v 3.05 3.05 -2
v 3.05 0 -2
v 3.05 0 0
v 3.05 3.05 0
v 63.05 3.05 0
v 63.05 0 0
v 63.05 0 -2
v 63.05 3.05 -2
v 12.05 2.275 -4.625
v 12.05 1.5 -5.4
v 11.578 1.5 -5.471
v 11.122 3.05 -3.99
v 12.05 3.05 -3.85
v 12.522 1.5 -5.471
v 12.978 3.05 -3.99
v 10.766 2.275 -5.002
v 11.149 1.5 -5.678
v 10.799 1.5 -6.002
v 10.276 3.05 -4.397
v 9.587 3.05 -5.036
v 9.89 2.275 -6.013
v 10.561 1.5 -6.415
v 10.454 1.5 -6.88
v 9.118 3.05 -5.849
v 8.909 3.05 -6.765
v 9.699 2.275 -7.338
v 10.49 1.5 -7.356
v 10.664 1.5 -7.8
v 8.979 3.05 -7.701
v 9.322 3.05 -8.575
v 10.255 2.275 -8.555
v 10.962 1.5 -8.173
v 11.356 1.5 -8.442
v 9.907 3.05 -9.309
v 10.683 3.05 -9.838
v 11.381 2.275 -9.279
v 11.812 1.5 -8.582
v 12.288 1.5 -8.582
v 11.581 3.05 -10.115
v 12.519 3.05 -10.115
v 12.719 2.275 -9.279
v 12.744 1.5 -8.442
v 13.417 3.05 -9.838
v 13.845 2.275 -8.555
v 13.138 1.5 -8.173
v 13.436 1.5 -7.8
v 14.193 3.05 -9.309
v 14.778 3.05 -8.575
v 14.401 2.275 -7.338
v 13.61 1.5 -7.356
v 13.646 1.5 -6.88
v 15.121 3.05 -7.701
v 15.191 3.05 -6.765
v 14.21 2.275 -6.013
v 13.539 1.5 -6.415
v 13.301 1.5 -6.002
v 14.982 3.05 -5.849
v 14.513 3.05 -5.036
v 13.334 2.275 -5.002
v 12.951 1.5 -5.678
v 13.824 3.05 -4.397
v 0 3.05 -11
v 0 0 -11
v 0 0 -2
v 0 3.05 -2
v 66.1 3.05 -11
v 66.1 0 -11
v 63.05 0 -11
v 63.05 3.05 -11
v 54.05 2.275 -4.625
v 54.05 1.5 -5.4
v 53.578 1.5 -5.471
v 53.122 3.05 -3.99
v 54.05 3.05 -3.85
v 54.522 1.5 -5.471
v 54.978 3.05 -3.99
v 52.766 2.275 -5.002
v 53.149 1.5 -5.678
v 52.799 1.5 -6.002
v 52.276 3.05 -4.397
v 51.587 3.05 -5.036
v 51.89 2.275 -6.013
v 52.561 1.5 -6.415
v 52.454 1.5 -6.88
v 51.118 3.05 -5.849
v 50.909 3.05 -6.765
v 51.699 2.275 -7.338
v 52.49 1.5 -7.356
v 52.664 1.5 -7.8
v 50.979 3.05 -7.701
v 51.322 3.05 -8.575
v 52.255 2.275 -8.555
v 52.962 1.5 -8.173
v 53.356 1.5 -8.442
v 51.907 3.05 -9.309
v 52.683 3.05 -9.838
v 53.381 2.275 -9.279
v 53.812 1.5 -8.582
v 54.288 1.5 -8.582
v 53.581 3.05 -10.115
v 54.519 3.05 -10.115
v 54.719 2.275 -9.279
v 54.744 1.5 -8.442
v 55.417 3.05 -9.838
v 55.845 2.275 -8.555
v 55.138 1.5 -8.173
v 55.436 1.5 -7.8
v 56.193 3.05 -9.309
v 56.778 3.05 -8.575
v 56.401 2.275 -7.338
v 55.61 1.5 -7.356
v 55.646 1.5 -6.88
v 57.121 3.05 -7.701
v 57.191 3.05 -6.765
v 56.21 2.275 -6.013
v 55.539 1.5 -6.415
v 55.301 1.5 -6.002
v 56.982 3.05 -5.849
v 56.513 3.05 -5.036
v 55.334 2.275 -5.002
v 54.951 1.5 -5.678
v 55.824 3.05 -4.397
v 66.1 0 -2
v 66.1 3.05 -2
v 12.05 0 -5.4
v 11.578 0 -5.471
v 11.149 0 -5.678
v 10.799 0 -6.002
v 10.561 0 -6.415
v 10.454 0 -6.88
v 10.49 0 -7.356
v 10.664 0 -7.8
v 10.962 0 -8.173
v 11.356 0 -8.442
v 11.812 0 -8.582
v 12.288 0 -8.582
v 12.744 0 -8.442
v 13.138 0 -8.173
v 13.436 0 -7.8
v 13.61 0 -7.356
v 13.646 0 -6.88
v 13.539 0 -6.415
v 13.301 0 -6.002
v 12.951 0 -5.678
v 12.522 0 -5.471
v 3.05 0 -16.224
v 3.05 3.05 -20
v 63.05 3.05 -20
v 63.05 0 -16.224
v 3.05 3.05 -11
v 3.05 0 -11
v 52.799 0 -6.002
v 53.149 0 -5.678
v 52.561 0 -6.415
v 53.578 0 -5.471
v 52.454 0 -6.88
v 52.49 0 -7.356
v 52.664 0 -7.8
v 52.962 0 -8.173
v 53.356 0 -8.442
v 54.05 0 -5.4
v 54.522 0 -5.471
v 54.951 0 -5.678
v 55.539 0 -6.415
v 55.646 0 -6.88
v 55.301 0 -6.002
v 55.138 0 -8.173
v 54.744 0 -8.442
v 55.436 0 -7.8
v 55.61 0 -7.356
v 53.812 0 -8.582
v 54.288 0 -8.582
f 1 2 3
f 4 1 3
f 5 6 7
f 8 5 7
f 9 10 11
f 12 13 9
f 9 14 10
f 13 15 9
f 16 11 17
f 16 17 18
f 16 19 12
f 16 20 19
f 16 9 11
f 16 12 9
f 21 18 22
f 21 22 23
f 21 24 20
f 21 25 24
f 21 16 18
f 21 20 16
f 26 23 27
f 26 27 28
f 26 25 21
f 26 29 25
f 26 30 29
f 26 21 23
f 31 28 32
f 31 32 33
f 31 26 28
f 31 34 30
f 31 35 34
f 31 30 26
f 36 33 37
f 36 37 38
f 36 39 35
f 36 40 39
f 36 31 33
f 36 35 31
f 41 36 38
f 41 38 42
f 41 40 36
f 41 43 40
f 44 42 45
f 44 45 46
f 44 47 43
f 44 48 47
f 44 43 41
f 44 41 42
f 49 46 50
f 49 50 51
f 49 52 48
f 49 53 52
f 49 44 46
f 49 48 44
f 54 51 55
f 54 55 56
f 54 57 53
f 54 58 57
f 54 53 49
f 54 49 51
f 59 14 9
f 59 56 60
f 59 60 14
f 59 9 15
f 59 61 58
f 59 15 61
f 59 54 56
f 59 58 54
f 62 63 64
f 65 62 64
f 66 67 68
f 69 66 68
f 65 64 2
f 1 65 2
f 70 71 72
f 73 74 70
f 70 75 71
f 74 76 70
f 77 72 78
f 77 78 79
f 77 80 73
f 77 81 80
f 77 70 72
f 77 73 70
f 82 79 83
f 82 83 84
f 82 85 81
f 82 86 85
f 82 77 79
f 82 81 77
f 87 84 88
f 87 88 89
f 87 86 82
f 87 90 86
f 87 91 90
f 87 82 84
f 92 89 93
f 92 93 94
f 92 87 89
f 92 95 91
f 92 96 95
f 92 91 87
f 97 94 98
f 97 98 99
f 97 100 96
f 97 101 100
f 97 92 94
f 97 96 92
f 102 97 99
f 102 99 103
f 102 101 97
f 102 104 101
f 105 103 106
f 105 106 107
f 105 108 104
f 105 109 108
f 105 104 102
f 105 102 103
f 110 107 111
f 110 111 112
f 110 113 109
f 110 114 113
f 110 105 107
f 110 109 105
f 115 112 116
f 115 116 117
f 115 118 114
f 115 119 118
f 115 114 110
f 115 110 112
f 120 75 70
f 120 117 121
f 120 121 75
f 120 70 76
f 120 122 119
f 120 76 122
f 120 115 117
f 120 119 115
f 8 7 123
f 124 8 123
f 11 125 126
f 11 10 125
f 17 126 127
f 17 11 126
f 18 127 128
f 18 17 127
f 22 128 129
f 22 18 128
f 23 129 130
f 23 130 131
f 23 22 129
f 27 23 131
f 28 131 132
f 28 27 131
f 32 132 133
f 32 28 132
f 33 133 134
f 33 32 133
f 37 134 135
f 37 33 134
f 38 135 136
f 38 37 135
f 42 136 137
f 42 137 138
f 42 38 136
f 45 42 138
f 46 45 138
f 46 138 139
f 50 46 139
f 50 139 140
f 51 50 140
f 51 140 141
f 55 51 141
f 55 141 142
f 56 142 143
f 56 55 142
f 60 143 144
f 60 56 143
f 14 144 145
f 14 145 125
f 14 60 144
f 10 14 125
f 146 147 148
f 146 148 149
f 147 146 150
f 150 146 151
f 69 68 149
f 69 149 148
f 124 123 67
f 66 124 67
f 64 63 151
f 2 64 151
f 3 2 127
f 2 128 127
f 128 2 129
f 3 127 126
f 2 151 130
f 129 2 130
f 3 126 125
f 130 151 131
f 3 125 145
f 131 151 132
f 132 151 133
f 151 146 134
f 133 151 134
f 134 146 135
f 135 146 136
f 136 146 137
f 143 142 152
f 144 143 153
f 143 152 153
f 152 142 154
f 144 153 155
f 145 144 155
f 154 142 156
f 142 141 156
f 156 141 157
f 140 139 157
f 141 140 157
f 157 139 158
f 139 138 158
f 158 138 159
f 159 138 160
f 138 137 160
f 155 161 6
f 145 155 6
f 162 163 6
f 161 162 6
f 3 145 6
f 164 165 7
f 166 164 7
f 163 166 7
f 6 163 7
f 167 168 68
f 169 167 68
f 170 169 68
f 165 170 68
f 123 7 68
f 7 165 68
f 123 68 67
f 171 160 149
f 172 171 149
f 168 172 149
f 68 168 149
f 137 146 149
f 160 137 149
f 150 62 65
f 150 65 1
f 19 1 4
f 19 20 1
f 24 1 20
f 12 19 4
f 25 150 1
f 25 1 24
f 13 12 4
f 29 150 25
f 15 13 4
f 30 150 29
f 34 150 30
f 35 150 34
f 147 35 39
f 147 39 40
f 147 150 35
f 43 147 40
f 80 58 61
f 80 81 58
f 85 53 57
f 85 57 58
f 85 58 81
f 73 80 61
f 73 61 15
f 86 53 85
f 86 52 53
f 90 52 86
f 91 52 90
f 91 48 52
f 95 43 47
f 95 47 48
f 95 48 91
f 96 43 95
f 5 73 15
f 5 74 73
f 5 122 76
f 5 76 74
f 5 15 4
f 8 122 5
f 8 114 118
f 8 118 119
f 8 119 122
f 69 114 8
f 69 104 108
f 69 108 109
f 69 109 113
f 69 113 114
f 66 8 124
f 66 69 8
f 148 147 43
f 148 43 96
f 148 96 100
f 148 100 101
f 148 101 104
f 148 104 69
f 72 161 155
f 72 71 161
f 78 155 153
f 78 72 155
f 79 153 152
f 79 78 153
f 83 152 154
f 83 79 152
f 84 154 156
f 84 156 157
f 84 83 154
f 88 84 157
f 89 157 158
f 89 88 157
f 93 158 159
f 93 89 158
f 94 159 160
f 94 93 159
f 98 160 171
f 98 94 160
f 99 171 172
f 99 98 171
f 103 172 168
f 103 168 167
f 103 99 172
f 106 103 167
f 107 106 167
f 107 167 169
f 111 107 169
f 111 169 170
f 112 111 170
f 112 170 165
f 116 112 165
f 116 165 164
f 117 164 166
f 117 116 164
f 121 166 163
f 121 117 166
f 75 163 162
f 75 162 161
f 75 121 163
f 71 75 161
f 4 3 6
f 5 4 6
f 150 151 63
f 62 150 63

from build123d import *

# Parameters (mm, degrees)
BOSS_EXTRUDE1_DEPTH = 3.05
CUT_EXTRUDE1_DEPTH  = 67.216349945


with BuildPart() as part:
    # Sketch1 → Boss-Extrude1 (new body)
    with BuildSketch(Plane(origin=(0, 0, 0), x_dir=(1, 0, 0), z_dir=(0, 1, 0))):
        with BuildLine():
            Line((12.05, 5.5), (12.05, 0))
            Line((12.05, 0), (54.05, 0))
            Line((54.05, 0), (54.05, 5.5))
            ThreePointArc((54.05, 5.5), (52.989339828, 8.060660172), (55.55, 7))
            Line((55.55, 7), (66.1, 7))
            Line((66.1, 7), (66.1, 11))
            Line((66.1, 11), (63.05, 11))
            Line((63.05, 11), (63.05, 20))
            Line((63.05, 20), (3.05, 20))
            Line((3.05, 20), (3.05, 11))
            Line((3.05, 11), (0, 11))
            Line((0, 11), (0, 7))
            Line((0, 7), (10.55, 7))
            ThreePointArc((10.55, 7), (12.05, 8.5), (13.55, 7))
            ThreePointArc((13.55, 7), (13.110660172, 5.939339828), (12.05, 5.5))
        make_face()
        with BuildLine():
            Line((3.05, 2), (3.05, 0))
            Line((3.05, 0), (12.05, 0))
            Line((12.05, 0), (12.05, 5.5))
            ThreePointArc((12.05, 5.5), (10.989339828, 5.939339828), (10.55, 7))
            Line((10.55, 7), (0, 7))
            Line((0, 7), (0, 2))
            Line((0, 2), (3.05, 2))
        make_face()
        with BuildLine():
            Line((54.05, 5.5), (54.05, 0))
            Line((54.05, 0), (63.05, 0))
            Line((63.05, 0), (63.05, 2))
            Line((63.05, 2), (66.1, 2))
            Line((66.1, 2), (66.1, 7))
            Line((66.1, 7), (55.55, 7))
            ThreePointArc((55.55, 7), (55.110660172, 5.939339828), (54.05, 5.5))
        make_face()
    extrude(amount=BOSS_EXTRUDE1_DEPTH)

    # Sketch5 → CSK for M3 Flat Head Machine Screw1 (revolve, cut)
    with BuildSketch(Plane(origin=(12.05, 3.05, -7), x_dir=(0, 0, 1), z_dir=(1, 0, 0))):
        Polygon((0, 0), (0, 3.05), (1.6, 3.05), (1.6, 1.55), (3.15, 0), align=None)
    revolve(axis=Axis((12.05, 9.4, -7), (0, -1, 0)), mode=Mode.SUBTRACT)

    # Sketch7 → CSK for M3 Flat Head Machine Screw2 (revolve, cut)
    with BuildSketch(Plane(origin=(54.05, 3.05, -7), x_dir=(0, 0, 1), z_dir=(1, 0, 0))):
        Polygon((0, 0), (0, 3.05), (1.6, 3.05), (1.6, 1.55), (3.15, 0), align=None)
    revolve(axis=Axis((54.05, 9.4, -7), (0, -1, 0)), mode=Mode.SUBTRACT)

    # Sketch8 → Cut-Extrude1 (cut, through all)
    with BuildSketch(Plane.ZY.offset(-3.05)):
        Polygon((-20, 0), (-20, 3.05), (-16.223809523, 0), align=None)
    extrude(amount=-CUT_EXTRUDE1_DEPTH, mode=Mode.SUBTRACT)


solid = part.part
